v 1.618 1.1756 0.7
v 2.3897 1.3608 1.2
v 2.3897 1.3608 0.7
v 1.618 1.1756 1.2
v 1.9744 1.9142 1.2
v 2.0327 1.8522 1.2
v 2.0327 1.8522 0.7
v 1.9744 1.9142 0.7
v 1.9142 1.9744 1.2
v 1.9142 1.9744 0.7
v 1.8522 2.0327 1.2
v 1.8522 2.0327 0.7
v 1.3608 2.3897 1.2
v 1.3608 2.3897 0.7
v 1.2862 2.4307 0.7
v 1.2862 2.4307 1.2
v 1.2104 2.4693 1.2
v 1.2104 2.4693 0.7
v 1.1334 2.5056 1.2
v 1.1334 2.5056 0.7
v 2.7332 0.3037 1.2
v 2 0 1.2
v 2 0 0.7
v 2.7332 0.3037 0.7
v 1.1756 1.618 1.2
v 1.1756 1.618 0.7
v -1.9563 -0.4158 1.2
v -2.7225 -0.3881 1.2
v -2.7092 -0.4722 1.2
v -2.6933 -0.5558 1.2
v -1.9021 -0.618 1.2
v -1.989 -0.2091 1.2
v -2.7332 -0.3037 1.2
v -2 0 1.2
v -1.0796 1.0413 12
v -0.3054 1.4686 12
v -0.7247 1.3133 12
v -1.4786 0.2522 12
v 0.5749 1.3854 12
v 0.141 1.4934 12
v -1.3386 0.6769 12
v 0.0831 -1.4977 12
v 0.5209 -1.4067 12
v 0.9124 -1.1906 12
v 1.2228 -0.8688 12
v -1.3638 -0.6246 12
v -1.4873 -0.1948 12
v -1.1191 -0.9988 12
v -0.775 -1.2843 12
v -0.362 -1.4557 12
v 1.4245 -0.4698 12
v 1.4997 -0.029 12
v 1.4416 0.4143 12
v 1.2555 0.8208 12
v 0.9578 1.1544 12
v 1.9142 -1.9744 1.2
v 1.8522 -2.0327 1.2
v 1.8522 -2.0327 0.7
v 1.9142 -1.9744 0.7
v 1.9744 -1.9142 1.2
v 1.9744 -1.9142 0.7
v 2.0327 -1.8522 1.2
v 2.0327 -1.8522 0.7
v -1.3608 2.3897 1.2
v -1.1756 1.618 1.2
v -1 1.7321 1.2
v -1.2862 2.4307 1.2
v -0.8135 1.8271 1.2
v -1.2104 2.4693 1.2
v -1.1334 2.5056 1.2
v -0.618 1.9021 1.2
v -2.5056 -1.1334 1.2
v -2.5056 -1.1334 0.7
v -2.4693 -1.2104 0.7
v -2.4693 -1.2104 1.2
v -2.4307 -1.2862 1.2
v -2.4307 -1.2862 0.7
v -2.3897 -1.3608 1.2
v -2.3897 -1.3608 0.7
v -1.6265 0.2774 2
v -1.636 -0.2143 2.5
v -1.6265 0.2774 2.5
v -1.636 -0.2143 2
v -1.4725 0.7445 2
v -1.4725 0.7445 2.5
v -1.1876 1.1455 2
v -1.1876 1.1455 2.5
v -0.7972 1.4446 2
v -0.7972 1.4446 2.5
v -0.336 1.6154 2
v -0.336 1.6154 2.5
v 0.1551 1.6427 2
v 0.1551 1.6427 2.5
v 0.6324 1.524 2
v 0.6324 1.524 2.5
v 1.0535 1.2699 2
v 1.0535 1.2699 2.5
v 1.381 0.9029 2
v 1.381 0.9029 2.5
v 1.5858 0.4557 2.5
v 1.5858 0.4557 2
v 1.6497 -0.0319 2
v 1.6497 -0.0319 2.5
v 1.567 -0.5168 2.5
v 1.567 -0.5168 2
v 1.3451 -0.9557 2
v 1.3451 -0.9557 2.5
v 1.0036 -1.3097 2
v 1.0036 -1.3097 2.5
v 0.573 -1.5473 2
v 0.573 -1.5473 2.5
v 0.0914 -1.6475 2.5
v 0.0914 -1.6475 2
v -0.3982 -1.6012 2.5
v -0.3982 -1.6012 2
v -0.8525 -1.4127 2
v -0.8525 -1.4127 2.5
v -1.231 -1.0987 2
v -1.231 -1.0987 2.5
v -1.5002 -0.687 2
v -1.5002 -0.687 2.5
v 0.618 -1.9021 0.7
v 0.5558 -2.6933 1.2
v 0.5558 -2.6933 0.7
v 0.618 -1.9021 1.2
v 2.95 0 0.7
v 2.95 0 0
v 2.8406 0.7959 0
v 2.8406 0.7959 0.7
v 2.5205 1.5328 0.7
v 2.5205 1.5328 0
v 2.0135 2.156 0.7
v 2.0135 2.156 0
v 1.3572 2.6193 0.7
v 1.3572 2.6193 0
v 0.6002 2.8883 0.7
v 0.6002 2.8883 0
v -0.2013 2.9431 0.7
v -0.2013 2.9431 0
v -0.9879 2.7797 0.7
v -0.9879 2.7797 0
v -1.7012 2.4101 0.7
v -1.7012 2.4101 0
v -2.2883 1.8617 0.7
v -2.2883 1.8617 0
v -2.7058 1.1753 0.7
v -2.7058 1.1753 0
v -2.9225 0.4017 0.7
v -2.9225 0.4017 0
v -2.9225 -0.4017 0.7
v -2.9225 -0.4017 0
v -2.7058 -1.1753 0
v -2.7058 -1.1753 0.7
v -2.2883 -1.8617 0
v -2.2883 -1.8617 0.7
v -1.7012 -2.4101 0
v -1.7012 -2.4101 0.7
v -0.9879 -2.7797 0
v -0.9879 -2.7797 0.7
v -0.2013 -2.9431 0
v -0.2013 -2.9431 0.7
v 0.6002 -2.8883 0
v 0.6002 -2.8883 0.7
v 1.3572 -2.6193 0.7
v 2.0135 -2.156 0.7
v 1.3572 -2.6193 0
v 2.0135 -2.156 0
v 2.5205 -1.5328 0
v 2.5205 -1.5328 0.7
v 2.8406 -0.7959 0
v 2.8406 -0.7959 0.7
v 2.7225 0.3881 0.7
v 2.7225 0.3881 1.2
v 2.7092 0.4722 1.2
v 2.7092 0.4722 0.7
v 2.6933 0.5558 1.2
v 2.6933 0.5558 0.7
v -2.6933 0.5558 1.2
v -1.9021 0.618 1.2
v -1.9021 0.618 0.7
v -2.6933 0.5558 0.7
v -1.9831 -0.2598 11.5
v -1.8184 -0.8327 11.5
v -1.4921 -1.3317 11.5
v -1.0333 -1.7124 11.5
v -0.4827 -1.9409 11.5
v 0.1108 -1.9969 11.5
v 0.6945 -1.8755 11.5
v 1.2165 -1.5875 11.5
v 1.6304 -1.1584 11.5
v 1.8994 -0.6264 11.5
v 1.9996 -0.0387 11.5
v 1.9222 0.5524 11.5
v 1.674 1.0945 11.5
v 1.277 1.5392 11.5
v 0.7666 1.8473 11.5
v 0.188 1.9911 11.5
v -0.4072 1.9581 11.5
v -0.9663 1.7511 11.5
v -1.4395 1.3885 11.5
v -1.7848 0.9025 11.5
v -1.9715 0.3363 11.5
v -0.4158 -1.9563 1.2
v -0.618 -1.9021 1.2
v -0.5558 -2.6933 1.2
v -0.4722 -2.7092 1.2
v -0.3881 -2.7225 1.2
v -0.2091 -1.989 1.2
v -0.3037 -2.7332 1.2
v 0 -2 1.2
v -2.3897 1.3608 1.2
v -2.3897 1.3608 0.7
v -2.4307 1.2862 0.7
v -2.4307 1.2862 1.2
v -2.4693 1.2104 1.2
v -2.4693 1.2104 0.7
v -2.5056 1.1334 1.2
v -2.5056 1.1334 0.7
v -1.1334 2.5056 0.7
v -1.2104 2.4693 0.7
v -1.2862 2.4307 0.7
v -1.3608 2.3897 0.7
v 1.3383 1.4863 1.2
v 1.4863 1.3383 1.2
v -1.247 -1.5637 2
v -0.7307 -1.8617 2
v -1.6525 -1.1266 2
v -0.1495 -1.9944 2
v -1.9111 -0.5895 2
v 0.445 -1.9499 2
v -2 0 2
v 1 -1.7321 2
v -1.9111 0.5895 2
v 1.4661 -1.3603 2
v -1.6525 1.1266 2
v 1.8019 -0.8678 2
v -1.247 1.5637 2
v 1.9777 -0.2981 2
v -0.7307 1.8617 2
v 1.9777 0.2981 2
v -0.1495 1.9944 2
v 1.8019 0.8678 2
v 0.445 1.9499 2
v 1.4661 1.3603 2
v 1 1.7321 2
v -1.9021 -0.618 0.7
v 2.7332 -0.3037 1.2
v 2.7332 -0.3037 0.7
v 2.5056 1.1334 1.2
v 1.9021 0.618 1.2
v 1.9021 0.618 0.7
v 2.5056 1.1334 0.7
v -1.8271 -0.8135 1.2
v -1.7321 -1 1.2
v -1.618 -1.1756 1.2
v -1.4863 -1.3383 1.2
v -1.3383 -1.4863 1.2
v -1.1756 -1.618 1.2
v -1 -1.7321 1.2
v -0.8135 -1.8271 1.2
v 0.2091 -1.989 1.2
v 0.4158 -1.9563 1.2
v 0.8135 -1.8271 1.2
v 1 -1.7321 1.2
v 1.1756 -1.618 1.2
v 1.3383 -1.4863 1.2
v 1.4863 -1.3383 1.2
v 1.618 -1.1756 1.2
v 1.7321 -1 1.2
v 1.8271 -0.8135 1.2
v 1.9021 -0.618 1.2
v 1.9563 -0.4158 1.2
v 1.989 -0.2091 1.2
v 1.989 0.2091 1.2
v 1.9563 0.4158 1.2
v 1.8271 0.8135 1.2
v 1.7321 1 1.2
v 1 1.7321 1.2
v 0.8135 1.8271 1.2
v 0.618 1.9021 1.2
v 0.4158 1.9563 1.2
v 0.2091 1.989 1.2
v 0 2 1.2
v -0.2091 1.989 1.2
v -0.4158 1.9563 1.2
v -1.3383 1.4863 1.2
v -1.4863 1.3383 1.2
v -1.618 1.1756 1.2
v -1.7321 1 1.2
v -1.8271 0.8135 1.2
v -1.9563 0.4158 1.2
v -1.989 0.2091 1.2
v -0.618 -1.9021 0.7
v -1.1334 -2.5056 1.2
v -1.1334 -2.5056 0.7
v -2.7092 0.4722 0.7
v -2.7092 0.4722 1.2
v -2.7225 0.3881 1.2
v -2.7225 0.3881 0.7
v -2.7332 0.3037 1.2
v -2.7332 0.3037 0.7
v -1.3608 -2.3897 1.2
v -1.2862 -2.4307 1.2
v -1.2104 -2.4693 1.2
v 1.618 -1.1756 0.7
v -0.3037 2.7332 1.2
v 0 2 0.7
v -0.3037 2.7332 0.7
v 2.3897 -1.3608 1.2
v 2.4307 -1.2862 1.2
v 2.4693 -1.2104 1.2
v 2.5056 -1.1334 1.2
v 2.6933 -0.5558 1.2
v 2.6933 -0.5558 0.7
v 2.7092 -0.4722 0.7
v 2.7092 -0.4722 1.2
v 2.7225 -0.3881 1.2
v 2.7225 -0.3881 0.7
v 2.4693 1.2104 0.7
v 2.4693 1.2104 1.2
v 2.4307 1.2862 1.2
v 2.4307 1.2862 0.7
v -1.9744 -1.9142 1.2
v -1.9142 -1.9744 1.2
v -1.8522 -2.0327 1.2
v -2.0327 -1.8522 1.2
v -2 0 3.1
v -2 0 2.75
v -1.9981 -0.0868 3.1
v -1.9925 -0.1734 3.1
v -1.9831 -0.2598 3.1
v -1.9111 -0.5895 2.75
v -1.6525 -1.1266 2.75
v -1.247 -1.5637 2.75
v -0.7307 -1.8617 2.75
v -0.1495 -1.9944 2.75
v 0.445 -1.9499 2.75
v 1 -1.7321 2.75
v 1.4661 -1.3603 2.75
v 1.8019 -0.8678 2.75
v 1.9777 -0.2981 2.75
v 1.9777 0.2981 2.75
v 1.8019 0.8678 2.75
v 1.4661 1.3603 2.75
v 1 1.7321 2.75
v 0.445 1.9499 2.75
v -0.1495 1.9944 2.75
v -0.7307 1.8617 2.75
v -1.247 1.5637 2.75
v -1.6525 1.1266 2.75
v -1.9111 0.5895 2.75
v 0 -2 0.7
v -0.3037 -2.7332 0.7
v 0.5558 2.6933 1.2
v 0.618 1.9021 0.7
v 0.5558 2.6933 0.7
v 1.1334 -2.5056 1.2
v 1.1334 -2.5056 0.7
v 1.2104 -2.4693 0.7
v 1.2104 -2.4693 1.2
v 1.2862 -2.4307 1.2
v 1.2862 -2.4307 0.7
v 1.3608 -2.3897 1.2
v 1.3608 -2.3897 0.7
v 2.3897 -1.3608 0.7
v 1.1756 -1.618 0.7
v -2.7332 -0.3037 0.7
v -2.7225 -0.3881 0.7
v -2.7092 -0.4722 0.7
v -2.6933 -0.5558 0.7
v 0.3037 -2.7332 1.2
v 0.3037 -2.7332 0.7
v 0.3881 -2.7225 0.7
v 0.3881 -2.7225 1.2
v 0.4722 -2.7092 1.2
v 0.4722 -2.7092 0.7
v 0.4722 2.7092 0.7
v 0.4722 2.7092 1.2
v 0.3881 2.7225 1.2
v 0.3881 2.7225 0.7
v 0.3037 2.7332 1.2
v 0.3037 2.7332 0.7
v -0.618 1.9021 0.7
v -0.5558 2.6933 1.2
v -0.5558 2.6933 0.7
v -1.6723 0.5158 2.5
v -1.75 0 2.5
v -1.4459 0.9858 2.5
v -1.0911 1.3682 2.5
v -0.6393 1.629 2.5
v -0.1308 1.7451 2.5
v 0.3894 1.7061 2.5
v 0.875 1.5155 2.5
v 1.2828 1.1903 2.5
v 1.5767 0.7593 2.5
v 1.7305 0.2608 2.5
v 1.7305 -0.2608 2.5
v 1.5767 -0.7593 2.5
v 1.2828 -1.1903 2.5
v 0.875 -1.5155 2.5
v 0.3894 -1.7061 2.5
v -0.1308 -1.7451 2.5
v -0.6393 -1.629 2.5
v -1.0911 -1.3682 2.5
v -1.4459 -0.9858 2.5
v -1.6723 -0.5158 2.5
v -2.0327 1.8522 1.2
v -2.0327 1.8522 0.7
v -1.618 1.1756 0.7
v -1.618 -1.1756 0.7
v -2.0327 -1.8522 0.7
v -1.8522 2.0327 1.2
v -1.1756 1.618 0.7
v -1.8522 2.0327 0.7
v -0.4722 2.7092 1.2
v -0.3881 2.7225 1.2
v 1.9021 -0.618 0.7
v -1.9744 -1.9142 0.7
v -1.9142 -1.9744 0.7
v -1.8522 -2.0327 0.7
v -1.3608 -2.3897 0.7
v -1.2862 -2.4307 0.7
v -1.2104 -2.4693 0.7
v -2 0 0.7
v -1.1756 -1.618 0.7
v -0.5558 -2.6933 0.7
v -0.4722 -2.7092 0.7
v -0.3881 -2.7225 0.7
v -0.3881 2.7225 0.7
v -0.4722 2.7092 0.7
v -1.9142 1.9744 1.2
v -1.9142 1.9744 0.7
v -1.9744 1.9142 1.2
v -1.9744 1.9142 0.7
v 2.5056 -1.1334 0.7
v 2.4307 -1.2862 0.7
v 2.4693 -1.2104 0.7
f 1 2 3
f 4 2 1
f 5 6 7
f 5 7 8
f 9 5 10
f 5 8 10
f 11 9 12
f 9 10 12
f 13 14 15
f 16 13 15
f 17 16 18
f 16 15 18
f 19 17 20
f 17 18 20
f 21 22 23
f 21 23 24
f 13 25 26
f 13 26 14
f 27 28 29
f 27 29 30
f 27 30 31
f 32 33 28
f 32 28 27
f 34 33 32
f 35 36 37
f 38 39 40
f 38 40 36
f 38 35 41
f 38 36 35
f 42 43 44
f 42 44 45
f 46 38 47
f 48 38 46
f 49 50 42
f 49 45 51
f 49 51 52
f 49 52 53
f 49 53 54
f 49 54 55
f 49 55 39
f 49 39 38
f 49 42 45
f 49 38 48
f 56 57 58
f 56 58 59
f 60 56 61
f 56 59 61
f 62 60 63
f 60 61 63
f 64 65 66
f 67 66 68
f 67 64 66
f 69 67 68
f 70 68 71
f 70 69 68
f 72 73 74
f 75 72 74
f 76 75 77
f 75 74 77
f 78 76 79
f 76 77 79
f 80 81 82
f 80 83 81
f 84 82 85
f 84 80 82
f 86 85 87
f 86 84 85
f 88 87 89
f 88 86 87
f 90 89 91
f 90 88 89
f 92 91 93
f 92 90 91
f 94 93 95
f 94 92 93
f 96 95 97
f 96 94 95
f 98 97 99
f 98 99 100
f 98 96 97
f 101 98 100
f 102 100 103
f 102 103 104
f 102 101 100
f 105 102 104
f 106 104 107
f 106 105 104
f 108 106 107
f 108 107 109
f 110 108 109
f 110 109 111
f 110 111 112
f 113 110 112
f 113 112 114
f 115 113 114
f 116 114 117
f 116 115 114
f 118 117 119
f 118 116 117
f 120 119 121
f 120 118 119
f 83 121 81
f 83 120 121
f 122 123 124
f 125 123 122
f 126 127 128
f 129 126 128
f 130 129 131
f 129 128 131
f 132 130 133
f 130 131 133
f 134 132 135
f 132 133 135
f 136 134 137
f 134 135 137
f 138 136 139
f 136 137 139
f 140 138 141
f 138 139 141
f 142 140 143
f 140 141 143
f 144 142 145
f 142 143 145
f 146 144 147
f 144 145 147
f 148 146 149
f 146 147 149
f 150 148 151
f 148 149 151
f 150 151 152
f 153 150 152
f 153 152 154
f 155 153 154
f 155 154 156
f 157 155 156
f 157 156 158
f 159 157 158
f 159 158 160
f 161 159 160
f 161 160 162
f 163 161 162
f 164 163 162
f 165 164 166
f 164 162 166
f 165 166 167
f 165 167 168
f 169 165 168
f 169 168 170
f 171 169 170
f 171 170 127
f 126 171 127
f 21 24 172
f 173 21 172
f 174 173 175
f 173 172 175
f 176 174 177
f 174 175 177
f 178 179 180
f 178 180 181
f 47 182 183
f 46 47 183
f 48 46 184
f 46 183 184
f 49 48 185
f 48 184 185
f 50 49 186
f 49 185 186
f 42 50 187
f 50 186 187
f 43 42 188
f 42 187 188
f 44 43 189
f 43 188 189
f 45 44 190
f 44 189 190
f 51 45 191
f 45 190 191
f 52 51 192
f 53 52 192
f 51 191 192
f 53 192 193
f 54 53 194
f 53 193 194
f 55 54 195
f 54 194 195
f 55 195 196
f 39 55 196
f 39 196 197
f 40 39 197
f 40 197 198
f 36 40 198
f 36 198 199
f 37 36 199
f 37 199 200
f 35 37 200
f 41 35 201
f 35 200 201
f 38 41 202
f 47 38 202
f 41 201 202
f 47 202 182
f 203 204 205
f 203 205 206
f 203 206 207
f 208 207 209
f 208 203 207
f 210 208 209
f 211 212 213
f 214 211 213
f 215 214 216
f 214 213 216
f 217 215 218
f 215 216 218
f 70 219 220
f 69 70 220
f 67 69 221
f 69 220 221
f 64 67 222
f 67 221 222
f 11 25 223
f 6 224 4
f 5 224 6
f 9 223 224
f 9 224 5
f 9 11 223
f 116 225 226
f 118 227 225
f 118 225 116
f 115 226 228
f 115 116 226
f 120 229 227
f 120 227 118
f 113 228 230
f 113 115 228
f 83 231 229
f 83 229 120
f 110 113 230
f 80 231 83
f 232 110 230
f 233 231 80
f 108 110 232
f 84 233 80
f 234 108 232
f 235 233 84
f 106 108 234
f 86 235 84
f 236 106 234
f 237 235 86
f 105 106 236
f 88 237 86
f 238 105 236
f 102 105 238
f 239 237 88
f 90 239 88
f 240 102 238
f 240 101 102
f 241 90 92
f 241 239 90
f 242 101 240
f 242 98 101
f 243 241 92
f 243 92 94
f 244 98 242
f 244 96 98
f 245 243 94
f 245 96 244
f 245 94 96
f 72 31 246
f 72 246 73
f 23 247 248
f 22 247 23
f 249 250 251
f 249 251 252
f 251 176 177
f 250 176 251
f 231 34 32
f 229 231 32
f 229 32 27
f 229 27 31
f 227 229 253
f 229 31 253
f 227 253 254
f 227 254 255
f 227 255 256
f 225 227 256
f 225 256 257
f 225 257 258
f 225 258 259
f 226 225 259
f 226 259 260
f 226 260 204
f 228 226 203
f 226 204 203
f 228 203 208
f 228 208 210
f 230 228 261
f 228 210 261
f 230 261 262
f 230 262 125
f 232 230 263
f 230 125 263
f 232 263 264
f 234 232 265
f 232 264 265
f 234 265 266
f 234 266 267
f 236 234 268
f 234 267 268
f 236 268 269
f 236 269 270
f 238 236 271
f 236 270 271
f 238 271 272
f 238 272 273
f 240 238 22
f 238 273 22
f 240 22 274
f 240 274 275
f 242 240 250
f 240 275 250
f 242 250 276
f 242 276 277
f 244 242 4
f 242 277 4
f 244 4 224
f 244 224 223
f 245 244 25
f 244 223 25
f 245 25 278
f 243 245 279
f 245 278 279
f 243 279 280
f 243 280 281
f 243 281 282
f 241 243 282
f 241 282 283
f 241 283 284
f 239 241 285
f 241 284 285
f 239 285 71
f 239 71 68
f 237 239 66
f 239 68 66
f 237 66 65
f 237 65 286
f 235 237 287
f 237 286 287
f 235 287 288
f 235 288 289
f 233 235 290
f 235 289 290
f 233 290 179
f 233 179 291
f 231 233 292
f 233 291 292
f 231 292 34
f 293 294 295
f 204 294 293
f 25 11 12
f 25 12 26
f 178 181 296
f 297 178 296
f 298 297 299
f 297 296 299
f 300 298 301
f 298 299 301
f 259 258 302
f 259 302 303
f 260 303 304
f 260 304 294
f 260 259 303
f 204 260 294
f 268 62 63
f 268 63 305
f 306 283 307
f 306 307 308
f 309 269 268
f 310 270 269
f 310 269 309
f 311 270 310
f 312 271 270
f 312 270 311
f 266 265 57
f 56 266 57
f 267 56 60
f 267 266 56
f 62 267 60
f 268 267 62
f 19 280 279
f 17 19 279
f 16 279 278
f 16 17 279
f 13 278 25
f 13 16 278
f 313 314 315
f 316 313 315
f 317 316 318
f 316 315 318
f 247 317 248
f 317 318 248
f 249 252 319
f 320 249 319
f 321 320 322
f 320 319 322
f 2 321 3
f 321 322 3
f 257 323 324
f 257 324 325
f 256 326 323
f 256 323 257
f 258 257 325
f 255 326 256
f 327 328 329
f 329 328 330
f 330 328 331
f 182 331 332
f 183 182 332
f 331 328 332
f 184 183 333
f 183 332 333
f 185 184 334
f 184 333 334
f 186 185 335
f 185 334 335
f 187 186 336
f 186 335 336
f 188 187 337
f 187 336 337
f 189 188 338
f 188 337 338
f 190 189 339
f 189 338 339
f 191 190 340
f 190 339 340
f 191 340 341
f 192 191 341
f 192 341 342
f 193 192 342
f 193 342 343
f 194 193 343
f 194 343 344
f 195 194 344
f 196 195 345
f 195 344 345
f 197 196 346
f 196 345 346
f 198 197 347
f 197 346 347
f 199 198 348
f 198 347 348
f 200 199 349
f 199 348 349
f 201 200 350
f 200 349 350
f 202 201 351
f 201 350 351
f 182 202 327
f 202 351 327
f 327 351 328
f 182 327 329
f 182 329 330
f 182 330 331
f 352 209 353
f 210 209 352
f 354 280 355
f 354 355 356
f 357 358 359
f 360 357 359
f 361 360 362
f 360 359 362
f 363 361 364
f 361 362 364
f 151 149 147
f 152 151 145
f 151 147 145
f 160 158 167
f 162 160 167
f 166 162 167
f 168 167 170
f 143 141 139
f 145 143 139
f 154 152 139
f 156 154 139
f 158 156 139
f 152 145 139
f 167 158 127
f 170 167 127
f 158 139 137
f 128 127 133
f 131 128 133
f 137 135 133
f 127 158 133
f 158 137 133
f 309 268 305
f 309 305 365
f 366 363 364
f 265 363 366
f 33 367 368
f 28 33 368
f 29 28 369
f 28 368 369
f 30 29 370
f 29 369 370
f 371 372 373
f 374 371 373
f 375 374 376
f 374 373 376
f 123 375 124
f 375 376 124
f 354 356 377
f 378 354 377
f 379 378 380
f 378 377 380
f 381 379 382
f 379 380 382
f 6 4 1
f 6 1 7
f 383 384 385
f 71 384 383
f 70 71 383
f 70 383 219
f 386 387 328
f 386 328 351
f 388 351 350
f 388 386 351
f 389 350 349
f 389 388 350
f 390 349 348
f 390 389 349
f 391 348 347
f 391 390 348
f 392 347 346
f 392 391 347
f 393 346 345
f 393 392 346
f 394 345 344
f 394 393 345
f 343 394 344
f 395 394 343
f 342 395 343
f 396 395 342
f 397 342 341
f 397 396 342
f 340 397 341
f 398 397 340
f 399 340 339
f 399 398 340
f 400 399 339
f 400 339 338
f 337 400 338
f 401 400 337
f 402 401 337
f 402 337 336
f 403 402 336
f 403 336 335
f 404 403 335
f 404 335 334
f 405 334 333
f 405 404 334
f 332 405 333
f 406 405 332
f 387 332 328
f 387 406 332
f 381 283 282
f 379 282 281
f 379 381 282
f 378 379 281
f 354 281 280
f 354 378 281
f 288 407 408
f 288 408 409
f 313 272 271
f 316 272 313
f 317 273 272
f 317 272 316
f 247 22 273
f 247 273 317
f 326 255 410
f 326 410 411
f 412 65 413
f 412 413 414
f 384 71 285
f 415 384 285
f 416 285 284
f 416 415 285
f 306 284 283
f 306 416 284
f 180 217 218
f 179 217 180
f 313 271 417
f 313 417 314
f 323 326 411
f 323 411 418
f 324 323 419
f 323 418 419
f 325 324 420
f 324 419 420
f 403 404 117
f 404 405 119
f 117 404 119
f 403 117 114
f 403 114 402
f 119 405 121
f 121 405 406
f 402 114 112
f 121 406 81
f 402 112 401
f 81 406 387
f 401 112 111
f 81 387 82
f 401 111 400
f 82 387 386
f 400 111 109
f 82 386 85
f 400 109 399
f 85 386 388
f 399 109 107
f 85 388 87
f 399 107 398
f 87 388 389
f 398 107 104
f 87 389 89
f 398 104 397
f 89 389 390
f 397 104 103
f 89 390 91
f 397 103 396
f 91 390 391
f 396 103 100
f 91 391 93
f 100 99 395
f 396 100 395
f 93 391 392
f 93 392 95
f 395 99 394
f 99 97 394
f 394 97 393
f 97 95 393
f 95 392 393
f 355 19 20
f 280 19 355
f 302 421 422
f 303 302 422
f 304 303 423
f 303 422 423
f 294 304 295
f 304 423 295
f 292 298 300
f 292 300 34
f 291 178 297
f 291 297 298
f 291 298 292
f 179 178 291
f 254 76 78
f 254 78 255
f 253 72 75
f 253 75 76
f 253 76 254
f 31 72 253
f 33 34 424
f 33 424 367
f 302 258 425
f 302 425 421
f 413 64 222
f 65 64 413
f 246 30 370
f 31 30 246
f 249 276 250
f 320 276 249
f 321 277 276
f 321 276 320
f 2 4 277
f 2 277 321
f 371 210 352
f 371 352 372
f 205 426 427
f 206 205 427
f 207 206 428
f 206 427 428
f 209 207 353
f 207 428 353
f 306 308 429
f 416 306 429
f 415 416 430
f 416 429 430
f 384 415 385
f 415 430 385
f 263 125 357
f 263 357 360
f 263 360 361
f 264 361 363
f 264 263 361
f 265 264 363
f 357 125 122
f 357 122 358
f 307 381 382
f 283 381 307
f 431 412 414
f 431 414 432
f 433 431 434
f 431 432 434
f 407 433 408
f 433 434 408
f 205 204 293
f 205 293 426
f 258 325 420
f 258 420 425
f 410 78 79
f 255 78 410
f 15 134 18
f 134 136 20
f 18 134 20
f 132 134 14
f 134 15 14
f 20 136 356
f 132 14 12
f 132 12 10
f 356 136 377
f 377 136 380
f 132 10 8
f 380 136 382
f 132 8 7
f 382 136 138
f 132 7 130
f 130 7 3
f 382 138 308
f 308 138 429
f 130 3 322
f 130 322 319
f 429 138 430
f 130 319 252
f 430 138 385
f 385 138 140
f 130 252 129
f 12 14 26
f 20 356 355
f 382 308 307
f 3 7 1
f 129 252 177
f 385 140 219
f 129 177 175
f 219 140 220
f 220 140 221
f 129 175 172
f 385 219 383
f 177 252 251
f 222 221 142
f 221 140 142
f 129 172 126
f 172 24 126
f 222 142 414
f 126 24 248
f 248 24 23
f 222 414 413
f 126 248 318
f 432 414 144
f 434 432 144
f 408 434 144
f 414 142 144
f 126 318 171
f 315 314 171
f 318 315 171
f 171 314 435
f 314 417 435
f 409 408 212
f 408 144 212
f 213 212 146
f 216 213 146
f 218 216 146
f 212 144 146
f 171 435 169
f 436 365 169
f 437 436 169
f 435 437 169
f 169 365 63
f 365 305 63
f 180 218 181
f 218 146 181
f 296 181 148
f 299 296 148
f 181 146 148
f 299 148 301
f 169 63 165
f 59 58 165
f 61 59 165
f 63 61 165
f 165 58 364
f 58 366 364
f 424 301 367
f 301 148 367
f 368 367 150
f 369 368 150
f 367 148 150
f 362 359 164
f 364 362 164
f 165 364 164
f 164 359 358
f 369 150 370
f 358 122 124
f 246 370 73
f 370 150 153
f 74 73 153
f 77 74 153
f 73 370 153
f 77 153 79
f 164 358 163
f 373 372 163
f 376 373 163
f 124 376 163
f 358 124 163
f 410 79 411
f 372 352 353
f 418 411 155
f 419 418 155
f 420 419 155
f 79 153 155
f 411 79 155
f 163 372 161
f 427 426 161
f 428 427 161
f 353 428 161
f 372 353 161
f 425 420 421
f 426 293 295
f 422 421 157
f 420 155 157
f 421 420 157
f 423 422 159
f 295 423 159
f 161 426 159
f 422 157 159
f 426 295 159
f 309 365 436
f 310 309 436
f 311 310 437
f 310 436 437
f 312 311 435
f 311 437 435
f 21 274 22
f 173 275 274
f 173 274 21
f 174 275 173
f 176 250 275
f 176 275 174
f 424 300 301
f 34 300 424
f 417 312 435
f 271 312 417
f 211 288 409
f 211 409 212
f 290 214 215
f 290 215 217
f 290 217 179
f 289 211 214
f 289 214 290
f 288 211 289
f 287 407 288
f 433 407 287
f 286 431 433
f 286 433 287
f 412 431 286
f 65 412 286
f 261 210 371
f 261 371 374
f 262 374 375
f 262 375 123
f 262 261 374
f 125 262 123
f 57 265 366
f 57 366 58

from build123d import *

# Parameters (mm, degrees)
SKETCH_1_R               = 2.95
EXTRUDE_1_DEPTH          = 1.2
SKETCH_2_R               = 2
EXTRUDE_2_DEPTH          = 1.9
CUT_EXTRUDE_1_DEPTH      = 0.5
PATTERN_CIRCULAR_1_COUNT = 20
SKETCH_4_W               = 0.35
SKETCH_4_H               = 0.5
SKETCH_6_W               = 8.9
SKETCH_6_H               = 2
CHAMFER_2_SIZE           = 0.5
CUT_EXTRUDE_START        = -0.5
SKETCH_7_R               = 2.95
SKETCH_7_R_2             = 2.75
CUT_EXTRUDE_2_DEPTH      = 0.5
CHAMFER_3_SIZE           = 0.25


with BuildPart() as part:
    # Эскиз1 → Вытянуть1 (new body)
    with BuildSketch(Plane.XY):
        Circle(SKETCH_1_R)
    extrude(amount=EXTRUDE_1_DEPTH)

    # Эскиз2 → Вытянуть2 (add)
    with BuildSketch(Plane.XY.offset(1.2)):
        with Locations(Location((0, 0, 0), (0, 0, 180))):
            Circle(SKETCH_2_R)
    extrude(amount=EXTRUDE_2_DEPTH)

    # Эскиз3 → Вырез-Вытянуть1 (cut)
    with BuildSketch(Plane.XY.offset(1.2)):
        Polygon((-0.393502884, 2.95), (0.393502884, 2.95), (0, 2), align=None)
    cut_extrude_1 = extrude(amount=-CUT_EXTRUDE_1_DEPTH, mode=Mode.SUBTRACT)

    # Круговой массив1: Вырез-Вытянуть1 ×20 about axis
    pattern_circular_1_axis = Axis((0, 0, 0), (0, 0, 1))
    for i in range(1, PATTERN_CIRCULAR_1_COUNT):
        add(cut_extrude_1.rotate(pattern_circular_1_axis, i * 360 / PATTERN_CIRCULAR_1_COUNT), mode=Mode.SUBTRACT)

    # Эскиз4 → Вырез-Повернуть1 (revolve, cut)
    with BuildSketch(Plane(origin=(0, 0, 0), x_dir=(1, 0, 0), z_dir=(0, 1, 0)), mode=Mode.PRIVATE) as cut_revolve_1_sk:
        with Locations((1.825, -2.25)):
            Rectangle(SKETCH_4_W, SKETCH_4_H)
    revolve(cut_revolve_1_sk.sketch.rotate(Axis((0, 0, 14.805168786), (0, 0, -1)), 172.537215717), axis=Axis((0, 0, 14.805168786), (0, 0, -1)), mode=Mode.SUBTRACT)

    # Эскиз6 → Повернуть1 (revolve)
    with BuildSketch(Plane(origin=(0, 0, 0), x_dir=(0, 0, -1), z_dir=(1, 0, 0)), mode=Mode.PRIVATE) as revolve_1_sk:
        with Locations((-7.55, -1)):
            Rectangle(SKETCH_6_W, SKETCH_6_H)
    revolve(revolve_1_sk.sketch.rotate(Axis((0, 0, 3.1), (0, 0, 1)), 277.462784283), axis=Axis((0, 0, 3.1), (0, 0, 1)))

    # Фаска2
    chamfer_2_edges = [part.edges().sort_by_distance(p)[0] for p in [
        (1.983058868, 0.25976437, 12),
    ]]
    chamfer(chamfer_2_edges, length=CHAMFER_2_SIZE)

    # Эскиз7 → Вырез-Вытянуть2 (cut)
    with BuildSketch(Plane.XY.offset(1.2).offset(CUT_EXTRUDE_START)):
        with Locations(Location((0, 0, 0), (0, 0, 180))):
            Circle(SKETCH_7_R)
        Circle(SKETCH_7_R_2, mode=Mode.SUBTRACT)
    extrude(amount=CUT_EXTRUDE_2_DEPTH, mode=Mode.SUBTRACT)

    # Фаска3
    chamfer_3_edges = [part.edges().sort_by_distance(p)[0] for p in [
        (2, 0, 2.5),
    ]]
    chamfer(chamfer_3_edges, length=CHAMFER_3_SIZE)


solid = part.part
